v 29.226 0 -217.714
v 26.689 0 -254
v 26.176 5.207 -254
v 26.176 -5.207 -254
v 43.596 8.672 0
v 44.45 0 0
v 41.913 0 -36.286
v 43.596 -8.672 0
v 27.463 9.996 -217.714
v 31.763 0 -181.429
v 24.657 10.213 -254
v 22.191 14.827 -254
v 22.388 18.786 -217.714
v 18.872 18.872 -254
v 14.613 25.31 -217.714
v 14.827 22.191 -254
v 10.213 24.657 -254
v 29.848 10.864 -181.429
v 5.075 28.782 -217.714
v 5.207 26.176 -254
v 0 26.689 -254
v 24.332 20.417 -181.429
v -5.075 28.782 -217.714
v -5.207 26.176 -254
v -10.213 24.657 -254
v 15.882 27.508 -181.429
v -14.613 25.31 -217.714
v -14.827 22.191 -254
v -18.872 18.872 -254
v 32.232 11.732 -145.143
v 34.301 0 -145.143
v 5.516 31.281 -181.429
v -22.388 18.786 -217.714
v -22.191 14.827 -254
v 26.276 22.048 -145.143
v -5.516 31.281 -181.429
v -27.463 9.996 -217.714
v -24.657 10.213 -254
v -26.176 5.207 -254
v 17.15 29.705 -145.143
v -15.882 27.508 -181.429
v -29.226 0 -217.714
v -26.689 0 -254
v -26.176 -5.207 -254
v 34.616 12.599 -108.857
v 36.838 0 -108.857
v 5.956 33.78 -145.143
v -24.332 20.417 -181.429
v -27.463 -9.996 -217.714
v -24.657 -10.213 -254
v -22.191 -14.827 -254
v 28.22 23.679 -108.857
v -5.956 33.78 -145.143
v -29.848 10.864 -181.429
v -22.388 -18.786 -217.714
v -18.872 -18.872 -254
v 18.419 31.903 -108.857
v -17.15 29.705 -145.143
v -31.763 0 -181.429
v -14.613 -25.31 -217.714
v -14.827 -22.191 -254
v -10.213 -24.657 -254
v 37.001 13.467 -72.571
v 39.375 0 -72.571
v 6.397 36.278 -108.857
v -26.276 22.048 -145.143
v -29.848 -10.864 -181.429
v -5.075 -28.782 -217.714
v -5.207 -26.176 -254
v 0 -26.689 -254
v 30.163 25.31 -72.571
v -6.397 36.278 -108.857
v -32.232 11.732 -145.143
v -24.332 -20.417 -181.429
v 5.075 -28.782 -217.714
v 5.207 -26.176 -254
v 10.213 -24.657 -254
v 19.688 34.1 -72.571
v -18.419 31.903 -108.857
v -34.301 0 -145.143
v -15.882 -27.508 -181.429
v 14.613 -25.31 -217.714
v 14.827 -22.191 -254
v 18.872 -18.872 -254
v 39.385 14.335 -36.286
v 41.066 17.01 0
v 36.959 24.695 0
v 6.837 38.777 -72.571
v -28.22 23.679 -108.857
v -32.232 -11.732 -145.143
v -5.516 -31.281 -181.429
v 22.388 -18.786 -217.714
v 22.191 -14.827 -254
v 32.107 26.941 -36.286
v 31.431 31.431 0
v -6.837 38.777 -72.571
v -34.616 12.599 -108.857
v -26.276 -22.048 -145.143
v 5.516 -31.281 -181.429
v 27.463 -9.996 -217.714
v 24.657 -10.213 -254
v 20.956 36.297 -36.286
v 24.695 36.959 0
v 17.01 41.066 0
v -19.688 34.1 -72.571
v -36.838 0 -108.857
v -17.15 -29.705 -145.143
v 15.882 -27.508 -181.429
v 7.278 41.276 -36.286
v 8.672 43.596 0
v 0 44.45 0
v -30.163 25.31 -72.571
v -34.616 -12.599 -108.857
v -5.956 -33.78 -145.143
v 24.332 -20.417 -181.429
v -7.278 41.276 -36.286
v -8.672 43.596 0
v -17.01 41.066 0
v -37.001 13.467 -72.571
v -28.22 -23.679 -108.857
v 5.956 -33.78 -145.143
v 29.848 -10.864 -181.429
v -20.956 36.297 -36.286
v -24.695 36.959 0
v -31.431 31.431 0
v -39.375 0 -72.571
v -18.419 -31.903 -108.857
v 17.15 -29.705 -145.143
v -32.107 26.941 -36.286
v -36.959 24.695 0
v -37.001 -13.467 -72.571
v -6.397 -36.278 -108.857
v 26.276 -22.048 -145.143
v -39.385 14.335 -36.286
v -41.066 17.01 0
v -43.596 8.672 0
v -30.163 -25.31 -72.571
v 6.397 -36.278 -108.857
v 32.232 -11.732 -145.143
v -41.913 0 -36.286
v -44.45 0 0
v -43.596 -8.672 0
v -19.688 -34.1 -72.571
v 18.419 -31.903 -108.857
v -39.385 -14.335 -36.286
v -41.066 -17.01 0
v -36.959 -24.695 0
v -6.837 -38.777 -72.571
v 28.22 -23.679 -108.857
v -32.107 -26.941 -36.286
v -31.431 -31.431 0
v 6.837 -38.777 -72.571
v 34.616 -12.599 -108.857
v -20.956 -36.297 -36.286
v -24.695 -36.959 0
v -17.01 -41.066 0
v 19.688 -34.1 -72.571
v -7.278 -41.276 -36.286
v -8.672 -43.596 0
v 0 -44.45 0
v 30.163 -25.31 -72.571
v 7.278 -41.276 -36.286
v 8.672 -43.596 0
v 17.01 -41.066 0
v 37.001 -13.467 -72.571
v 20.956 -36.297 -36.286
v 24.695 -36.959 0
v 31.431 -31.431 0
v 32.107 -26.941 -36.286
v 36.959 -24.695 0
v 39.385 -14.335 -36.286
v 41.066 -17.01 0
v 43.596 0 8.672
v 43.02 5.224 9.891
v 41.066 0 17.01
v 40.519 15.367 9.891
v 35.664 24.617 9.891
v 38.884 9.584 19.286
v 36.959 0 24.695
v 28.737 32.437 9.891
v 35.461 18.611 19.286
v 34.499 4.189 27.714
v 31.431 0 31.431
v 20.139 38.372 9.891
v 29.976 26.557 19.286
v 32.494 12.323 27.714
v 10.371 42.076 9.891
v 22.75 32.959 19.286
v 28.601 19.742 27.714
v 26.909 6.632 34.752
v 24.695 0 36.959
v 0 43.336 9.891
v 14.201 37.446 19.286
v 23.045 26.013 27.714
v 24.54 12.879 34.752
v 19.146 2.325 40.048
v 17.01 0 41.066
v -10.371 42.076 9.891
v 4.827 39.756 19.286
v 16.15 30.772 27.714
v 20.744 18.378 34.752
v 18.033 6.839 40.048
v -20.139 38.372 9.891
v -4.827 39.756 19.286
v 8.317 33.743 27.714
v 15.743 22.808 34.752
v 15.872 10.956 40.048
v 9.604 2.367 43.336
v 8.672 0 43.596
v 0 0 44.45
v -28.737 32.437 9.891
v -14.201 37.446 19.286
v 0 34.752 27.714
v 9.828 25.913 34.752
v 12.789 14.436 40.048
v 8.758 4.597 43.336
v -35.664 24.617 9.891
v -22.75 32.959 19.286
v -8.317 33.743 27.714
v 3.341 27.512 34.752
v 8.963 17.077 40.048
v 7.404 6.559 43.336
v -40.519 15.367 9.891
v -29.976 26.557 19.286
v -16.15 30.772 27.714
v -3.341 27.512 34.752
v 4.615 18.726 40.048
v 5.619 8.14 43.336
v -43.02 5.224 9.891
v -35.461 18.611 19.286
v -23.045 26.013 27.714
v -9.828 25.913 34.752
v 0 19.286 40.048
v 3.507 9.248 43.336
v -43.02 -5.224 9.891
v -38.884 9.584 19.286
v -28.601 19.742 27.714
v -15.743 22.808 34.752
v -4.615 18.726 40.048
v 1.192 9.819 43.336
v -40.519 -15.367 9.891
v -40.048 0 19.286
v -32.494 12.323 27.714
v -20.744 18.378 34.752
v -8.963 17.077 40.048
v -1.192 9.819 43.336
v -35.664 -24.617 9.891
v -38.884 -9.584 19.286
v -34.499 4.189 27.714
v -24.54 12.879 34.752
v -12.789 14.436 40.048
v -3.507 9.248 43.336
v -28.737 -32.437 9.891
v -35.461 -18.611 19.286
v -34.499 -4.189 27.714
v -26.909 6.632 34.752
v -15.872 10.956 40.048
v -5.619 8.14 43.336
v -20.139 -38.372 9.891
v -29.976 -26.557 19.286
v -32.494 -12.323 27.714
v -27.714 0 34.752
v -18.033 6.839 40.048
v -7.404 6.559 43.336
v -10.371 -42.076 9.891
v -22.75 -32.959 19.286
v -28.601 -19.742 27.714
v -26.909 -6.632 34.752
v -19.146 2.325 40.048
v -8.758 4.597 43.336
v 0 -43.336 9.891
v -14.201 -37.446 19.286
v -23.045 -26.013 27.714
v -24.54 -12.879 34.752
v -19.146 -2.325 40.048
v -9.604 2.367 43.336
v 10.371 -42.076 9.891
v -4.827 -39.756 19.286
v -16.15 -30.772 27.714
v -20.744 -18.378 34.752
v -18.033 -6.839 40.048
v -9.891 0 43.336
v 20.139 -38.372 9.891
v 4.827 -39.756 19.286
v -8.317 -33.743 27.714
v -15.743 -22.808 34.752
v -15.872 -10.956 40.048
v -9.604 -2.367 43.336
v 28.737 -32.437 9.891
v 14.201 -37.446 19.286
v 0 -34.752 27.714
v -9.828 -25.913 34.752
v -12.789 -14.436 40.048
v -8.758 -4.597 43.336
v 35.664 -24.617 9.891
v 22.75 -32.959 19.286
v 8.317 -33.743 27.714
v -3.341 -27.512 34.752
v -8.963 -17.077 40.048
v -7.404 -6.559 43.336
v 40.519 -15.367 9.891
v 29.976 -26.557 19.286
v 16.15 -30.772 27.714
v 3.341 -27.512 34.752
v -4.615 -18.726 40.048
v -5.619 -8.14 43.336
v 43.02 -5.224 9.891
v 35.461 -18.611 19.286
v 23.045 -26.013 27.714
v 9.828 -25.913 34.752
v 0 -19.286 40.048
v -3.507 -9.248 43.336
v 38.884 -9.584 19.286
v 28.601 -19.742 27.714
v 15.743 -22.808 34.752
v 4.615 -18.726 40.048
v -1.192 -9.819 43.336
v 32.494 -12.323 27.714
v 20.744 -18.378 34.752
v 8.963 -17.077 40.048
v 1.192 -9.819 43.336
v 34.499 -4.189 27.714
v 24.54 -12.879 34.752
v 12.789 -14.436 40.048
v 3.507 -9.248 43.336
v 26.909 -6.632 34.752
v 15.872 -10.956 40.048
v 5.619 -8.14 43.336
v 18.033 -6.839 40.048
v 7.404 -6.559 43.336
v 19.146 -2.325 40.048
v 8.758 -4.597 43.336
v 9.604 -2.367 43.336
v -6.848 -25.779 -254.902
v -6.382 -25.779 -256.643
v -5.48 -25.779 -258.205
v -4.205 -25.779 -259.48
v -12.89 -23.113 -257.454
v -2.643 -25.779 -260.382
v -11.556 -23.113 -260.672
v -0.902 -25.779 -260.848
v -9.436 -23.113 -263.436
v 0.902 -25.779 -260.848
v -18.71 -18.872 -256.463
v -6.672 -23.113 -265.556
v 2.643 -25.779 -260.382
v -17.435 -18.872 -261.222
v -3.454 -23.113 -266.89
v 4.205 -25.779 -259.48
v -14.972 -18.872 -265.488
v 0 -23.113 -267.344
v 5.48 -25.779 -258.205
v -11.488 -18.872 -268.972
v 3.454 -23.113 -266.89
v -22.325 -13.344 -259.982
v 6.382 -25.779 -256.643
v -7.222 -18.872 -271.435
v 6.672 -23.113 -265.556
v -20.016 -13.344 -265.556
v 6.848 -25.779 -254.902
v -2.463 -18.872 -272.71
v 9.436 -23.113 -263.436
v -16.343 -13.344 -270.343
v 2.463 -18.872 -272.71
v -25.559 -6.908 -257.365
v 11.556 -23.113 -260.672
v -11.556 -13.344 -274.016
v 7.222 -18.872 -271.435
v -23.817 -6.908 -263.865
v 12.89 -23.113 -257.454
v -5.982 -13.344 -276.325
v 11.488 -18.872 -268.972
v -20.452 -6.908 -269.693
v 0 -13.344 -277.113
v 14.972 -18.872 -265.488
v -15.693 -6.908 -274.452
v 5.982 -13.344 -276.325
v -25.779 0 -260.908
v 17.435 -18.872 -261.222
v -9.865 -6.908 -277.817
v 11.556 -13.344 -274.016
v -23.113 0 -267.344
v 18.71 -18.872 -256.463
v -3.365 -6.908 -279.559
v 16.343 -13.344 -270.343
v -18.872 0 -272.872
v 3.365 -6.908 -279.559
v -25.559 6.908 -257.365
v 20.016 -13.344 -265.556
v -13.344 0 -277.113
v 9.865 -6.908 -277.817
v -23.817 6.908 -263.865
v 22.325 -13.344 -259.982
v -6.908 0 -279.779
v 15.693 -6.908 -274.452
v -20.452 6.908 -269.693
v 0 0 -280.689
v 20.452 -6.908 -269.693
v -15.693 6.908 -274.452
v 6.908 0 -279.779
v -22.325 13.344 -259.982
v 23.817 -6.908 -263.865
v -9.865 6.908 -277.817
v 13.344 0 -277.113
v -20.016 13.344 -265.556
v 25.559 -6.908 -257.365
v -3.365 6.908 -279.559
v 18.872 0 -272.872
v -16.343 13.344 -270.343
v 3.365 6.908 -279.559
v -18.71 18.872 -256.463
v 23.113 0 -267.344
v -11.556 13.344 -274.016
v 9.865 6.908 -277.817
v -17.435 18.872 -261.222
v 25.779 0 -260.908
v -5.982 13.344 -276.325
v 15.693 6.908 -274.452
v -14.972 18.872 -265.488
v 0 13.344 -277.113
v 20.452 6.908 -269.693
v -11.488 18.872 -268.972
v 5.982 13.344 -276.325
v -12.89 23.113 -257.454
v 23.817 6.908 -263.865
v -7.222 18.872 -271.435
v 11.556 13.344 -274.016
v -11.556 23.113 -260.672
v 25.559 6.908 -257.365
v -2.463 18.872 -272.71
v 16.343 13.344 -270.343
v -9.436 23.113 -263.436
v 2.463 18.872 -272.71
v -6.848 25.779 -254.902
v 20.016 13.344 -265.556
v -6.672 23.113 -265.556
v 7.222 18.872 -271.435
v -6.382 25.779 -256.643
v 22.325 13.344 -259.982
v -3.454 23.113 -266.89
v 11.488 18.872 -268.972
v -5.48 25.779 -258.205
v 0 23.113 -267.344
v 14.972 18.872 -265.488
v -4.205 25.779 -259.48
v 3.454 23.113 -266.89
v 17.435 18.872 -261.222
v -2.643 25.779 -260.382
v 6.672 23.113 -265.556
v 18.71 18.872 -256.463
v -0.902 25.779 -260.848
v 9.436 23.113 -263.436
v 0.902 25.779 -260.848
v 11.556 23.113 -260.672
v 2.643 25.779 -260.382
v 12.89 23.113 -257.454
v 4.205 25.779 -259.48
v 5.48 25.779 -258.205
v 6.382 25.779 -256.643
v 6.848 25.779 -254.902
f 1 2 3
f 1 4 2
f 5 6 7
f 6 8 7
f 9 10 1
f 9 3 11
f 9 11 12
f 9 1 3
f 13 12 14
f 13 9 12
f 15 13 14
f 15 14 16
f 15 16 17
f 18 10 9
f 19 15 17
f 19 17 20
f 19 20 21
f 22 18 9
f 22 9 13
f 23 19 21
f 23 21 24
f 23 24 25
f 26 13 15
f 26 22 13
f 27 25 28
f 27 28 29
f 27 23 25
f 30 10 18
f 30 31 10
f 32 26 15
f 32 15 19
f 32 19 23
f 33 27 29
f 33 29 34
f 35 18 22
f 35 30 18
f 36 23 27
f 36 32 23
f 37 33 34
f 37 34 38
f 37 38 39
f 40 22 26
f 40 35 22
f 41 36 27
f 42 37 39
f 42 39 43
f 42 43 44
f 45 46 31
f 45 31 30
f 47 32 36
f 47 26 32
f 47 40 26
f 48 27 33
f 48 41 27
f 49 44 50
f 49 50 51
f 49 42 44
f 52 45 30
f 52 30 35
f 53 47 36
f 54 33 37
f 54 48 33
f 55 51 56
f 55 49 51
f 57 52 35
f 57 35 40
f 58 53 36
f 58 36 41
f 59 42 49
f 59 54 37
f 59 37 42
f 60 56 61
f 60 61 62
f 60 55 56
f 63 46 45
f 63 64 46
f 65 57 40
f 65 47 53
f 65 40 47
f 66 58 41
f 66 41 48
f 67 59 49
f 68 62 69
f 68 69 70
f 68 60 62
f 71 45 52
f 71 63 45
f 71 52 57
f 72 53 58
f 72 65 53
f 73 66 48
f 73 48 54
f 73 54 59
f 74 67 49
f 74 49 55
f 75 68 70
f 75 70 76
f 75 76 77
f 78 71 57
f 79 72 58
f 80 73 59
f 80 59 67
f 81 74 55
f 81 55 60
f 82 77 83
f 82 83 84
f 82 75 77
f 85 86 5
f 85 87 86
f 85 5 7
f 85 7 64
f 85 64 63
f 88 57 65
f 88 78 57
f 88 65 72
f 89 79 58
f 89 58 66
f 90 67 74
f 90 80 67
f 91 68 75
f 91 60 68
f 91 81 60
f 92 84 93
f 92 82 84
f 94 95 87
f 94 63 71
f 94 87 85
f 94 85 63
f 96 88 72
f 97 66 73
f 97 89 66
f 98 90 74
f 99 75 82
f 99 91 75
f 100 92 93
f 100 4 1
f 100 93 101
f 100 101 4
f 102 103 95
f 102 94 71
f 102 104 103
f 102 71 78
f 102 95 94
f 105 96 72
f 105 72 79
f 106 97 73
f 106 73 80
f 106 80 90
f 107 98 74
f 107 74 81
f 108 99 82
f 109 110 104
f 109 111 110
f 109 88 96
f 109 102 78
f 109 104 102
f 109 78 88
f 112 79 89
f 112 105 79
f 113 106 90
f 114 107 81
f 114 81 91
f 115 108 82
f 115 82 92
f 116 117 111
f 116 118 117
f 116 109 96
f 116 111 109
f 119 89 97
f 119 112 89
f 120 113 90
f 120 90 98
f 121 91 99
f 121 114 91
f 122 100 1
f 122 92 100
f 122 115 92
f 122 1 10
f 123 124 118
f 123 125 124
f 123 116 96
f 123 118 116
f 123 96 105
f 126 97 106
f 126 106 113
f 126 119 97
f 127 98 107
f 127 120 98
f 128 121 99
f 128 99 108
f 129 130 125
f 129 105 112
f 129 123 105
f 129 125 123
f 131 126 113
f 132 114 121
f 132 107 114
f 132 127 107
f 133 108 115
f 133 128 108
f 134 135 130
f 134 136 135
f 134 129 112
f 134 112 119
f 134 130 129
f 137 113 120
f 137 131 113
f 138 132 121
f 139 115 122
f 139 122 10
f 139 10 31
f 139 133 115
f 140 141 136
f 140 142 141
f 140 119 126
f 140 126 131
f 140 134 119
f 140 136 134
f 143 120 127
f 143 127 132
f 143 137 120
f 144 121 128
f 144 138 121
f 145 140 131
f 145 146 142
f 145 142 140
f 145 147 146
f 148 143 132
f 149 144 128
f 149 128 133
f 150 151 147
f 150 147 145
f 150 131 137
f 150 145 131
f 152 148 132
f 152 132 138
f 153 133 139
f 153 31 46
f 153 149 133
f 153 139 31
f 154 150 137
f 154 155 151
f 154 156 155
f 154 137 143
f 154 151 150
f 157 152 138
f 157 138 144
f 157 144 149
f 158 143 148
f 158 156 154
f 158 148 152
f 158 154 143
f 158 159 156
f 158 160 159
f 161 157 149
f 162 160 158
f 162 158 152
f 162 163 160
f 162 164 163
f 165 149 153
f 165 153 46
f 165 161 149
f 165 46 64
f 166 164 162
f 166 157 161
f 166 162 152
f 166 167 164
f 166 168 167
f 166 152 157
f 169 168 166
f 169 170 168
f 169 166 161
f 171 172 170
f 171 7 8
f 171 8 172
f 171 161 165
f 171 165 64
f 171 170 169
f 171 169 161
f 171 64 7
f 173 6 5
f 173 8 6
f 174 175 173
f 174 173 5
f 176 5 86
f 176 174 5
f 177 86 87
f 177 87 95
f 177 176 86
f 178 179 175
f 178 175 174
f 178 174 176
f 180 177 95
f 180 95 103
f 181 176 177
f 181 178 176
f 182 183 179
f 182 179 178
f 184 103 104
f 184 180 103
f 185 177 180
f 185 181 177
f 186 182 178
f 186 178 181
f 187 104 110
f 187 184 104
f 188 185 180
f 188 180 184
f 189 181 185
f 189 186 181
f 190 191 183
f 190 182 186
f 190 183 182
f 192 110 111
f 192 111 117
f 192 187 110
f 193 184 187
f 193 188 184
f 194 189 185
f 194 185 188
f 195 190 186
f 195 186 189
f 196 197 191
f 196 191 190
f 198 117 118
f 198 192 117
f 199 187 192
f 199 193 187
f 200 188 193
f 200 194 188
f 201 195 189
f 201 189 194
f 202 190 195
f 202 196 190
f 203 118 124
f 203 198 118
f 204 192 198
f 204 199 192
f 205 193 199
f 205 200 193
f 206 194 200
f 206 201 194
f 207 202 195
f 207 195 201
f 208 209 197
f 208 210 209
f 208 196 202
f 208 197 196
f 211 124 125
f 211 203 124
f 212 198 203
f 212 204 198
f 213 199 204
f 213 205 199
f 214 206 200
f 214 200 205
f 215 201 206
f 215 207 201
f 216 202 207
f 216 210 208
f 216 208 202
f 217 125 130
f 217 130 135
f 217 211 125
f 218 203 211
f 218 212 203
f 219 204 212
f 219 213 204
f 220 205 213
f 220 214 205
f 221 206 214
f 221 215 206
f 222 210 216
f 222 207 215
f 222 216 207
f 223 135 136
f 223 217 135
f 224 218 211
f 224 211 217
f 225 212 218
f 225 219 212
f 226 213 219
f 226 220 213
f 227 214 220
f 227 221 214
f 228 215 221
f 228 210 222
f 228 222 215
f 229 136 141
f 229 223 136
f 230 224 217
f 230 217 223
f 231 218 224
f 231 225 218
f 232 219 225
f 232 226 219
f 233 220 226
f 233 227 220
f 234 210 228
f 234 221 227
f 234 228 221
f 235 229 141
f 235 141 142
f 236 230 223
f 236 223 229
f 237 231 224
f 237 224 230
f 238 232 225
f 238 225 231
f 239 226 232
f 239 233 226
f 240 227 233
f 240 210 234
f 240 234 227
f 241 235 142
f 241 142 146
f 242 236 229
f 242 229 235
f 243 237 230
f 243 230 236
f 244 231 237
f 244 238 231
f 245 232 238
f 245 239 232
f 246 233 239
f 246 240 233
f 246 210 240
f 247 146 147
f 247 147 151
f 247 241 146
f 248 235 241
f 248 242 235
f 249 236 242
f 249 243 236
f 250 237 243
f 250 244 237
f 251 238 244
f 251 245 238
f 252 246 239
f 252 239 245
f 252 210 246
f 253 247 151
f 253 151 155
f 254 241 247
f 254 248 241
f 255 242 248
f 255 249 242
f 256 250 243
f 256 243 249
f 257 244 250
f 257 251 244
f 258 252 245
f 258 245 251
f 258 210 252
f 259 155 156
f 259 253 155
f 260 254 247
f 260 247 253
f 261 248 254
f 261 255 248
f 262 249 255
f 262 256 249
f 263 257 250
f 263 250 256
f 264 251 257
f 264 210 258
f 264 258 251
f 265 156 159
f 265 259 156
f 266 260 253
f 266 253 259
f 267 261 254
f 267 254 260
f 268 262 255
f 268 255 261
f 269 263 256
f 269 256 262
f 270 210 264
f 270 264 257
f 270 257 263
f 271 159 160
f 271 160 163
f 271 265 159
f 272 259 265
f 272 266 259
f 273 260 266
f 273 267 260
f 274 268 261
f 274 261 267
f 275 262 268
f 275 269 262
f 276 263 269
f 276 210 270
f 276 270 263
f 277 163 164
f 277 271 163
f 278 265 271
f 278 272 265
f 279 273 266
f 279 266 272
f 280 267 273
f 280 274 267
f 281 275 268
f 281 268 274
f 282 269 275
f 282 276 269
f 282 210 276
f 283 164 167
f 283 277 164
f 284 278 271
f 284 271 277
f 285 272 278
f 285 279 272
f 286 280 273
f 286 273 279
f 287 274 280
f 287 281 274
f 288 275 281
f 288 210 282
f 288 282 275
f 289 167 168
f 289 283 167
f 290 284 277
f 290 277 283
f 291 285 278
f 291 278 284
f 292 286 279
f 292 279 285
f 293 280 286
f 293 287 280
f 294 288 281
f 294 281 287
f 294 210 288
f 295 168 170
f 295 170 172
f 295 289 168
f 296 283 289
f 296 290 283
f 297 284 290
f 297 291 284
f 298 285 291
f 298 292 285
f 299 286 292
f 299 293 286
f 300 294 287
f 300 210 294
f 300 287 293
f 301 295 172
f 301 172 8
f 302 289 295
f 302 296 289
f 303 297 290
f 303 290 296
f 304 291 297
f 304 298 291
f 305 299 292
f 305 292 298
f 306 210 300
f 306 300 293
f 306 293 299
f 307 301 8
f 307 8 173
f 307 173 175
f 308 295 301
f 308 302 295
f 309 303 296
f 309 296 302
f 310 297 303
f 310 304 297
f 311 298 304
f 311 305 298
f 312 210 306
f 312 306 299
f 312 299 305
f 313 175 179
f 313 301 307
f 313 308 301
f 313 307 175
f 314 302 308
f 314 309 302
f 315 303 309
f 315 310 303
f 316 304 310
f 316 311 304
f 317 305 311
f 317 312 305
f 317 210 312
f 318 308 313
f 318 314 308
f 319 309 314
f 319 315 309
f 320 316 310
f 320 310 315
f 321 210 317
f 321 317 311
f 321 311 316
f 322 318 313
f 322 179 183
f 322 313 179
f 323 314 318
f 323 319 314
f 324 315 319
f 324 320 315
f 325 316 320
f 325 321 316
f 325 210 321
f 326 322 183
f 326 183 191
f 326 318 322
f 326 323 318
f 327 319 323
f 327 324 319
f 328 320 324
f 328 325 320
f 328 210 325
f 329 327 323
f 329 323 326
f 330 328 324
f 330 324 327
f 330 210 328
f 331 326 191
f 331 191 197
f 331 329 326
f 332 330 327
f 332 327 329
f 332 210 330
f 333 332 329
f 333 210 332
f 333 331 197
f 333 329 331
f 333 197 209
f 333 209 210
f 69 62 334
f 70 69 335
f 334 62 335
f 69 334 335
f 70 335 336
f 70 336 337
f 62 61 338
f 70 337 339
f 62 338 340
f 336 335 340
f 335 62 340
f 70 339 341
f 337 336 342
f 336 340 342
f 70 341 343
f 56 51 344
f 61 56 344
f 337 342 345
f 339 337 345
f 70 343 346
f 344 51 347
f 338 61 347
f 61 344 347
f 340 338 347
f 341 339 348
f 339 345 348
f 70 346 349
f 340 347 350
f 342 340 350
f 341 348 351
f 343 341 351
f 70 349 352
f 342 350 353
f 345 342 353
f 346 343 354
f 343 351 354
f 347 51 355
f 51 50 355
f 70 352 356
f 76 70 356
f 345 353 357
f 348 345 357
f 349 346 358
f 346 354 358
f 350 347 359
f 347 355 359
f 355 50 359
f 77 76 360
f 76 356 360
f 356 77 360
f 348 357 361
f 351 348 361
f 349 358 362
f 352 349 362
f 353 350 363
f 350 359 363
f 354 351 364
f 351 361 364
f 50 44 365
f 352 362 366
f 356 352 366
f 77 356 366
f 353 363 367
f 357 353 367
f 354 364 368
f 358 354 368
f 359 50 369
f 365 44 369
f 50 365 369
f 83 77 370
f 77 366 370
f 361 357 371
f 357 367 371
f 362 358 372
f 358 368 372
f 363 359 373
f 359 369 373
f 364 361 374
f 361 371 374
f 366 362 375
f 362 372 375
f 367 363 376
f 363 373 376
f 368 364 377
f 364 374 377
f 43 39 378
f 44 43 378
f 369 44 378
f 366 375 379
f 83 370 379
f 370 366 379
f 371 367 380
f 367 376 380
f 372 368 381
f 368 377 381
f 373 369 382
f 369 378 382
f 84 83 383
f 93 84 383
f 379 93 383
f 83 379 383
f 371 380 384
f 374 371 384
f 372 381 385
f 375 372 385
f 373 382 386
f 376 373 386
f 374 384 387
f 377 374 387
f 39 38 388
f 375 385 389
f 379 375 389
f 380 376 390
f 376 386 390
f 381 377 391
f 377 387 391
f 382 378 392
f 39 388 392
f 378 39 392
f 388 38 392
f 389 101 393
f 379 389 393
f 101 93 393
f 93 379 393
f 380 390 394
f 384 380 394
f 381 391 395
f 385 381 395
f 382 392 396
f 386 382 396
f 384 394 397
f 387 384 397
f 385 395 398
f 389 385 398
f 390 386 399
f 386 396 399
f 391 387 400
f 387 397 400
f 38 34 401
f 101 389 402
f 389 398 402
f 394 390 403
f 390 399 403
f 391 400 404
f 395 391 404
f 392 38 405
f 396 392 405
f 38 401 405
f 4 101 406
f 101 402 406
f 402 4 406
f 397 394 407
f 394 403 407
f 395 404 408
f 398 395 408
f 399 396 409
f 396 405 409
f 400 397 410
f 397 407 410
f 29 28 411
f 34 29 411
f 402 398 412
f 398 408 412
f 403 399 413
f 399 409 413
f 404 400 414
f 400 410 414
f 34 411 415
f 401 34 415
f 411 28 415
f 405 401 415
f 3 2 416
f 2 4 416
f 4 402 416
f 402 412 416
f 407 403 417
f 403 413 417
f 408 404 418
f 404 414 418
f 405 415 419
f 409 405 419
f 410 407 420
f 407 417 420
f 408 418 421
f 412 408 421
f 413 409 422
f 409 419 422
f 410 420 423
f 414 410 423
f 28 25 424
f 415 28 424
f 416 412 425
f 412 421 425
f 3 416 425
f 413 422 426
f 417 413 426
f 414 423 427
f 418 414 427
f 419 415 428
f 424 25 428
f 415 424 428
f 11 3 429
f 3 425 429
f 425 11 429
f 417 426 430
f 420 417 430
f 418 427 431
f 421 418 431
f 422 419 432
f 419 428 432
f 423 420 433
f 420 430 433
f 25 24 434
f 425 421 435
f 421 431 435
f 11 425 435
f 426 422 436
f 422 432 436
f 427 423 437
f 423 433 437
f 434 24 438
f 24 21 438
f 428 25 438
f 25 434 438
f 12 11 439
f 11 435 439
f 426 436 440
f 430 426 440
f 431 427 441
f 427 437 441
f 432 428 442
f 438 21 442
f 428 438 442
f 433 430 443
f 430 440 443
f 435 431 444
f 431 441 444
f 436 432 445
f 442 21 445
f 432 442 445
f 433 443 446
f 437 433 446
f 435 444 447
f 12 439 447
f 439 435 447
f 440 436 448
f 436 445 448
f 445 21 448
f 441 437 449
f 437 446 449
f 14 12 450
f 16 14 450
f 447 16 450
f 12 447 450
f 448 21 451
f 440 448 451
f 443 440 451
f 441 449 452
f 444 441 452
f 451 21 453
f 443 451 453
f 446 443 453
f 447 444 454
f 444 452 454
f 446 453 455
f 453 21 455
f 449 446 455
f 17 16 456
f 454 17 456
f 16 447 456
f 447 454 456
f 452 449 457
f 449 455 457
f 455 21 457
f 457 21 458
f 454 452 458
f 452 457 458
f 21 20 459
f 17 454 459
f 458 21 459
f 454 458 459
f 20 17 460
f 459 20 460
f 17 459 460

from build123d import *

# Parameters (mm, degrees)
SKETCH1_R           = 44.45
BOSS_EXTRUDE1_DEPTH = 254
BOSS_EXTRUDE1_DRAFT = -4


# Read off the part's stored shape, not the designer's step: Revolve1
with BuildPart() as part:
    # Sketch1 → Boss-Extrude1 (with draft: the straight prism first)
    with BuildSketch(Plane.XY):
        Circle(SKETCH1_R)
    extrude(amount=-BOSS_EXTRUDE1_DEPTH)
    # Boss-Extrude1: the draft: its side faces are tilted about the plane it starts from
    boss_extrude1_sides = [part.faces().sort_by_distance(p)[0] for p in [
        (-44.45, 0, -127),
    ]]
    draft(boss_extrude1_sides, Plane.XY, BOSS_EXTRUDE1_DRAFT)

    # Revolve1 outline → Revolve1 (revolve)
    with BuildSketch(Plane.XZ):
        with BuildLine():
            Line((0, 0), (44.45, -4.4e-08))
            ThreePointArc((44.45, -4.4e-08), (31.430896439, 31.430896408), (0, 44.45))
            Line((0, 44.45), (0, 0))
        make_face()
    revolve(axis=Axis((0, 0, 0), (0, 0, 1)))

    # Sketch5 → Revolve2 (revolve)
    with BuildSketch(Plane(origin=(0, 0, 0), x_dir=(0, 0, -1), z_dir=(1, 0, 0))):
        with BuildLine():
            Line((254, 26.688589766), (254, -26.688589766))
            ThreePointArc((254, -26.688589766), (280.688589766, 0), (254, 26.688589766))
        make_face()
    revolve(axis=Axis((0, 26.688589766, -254), (0, -1, 0)))


solid = part.part
